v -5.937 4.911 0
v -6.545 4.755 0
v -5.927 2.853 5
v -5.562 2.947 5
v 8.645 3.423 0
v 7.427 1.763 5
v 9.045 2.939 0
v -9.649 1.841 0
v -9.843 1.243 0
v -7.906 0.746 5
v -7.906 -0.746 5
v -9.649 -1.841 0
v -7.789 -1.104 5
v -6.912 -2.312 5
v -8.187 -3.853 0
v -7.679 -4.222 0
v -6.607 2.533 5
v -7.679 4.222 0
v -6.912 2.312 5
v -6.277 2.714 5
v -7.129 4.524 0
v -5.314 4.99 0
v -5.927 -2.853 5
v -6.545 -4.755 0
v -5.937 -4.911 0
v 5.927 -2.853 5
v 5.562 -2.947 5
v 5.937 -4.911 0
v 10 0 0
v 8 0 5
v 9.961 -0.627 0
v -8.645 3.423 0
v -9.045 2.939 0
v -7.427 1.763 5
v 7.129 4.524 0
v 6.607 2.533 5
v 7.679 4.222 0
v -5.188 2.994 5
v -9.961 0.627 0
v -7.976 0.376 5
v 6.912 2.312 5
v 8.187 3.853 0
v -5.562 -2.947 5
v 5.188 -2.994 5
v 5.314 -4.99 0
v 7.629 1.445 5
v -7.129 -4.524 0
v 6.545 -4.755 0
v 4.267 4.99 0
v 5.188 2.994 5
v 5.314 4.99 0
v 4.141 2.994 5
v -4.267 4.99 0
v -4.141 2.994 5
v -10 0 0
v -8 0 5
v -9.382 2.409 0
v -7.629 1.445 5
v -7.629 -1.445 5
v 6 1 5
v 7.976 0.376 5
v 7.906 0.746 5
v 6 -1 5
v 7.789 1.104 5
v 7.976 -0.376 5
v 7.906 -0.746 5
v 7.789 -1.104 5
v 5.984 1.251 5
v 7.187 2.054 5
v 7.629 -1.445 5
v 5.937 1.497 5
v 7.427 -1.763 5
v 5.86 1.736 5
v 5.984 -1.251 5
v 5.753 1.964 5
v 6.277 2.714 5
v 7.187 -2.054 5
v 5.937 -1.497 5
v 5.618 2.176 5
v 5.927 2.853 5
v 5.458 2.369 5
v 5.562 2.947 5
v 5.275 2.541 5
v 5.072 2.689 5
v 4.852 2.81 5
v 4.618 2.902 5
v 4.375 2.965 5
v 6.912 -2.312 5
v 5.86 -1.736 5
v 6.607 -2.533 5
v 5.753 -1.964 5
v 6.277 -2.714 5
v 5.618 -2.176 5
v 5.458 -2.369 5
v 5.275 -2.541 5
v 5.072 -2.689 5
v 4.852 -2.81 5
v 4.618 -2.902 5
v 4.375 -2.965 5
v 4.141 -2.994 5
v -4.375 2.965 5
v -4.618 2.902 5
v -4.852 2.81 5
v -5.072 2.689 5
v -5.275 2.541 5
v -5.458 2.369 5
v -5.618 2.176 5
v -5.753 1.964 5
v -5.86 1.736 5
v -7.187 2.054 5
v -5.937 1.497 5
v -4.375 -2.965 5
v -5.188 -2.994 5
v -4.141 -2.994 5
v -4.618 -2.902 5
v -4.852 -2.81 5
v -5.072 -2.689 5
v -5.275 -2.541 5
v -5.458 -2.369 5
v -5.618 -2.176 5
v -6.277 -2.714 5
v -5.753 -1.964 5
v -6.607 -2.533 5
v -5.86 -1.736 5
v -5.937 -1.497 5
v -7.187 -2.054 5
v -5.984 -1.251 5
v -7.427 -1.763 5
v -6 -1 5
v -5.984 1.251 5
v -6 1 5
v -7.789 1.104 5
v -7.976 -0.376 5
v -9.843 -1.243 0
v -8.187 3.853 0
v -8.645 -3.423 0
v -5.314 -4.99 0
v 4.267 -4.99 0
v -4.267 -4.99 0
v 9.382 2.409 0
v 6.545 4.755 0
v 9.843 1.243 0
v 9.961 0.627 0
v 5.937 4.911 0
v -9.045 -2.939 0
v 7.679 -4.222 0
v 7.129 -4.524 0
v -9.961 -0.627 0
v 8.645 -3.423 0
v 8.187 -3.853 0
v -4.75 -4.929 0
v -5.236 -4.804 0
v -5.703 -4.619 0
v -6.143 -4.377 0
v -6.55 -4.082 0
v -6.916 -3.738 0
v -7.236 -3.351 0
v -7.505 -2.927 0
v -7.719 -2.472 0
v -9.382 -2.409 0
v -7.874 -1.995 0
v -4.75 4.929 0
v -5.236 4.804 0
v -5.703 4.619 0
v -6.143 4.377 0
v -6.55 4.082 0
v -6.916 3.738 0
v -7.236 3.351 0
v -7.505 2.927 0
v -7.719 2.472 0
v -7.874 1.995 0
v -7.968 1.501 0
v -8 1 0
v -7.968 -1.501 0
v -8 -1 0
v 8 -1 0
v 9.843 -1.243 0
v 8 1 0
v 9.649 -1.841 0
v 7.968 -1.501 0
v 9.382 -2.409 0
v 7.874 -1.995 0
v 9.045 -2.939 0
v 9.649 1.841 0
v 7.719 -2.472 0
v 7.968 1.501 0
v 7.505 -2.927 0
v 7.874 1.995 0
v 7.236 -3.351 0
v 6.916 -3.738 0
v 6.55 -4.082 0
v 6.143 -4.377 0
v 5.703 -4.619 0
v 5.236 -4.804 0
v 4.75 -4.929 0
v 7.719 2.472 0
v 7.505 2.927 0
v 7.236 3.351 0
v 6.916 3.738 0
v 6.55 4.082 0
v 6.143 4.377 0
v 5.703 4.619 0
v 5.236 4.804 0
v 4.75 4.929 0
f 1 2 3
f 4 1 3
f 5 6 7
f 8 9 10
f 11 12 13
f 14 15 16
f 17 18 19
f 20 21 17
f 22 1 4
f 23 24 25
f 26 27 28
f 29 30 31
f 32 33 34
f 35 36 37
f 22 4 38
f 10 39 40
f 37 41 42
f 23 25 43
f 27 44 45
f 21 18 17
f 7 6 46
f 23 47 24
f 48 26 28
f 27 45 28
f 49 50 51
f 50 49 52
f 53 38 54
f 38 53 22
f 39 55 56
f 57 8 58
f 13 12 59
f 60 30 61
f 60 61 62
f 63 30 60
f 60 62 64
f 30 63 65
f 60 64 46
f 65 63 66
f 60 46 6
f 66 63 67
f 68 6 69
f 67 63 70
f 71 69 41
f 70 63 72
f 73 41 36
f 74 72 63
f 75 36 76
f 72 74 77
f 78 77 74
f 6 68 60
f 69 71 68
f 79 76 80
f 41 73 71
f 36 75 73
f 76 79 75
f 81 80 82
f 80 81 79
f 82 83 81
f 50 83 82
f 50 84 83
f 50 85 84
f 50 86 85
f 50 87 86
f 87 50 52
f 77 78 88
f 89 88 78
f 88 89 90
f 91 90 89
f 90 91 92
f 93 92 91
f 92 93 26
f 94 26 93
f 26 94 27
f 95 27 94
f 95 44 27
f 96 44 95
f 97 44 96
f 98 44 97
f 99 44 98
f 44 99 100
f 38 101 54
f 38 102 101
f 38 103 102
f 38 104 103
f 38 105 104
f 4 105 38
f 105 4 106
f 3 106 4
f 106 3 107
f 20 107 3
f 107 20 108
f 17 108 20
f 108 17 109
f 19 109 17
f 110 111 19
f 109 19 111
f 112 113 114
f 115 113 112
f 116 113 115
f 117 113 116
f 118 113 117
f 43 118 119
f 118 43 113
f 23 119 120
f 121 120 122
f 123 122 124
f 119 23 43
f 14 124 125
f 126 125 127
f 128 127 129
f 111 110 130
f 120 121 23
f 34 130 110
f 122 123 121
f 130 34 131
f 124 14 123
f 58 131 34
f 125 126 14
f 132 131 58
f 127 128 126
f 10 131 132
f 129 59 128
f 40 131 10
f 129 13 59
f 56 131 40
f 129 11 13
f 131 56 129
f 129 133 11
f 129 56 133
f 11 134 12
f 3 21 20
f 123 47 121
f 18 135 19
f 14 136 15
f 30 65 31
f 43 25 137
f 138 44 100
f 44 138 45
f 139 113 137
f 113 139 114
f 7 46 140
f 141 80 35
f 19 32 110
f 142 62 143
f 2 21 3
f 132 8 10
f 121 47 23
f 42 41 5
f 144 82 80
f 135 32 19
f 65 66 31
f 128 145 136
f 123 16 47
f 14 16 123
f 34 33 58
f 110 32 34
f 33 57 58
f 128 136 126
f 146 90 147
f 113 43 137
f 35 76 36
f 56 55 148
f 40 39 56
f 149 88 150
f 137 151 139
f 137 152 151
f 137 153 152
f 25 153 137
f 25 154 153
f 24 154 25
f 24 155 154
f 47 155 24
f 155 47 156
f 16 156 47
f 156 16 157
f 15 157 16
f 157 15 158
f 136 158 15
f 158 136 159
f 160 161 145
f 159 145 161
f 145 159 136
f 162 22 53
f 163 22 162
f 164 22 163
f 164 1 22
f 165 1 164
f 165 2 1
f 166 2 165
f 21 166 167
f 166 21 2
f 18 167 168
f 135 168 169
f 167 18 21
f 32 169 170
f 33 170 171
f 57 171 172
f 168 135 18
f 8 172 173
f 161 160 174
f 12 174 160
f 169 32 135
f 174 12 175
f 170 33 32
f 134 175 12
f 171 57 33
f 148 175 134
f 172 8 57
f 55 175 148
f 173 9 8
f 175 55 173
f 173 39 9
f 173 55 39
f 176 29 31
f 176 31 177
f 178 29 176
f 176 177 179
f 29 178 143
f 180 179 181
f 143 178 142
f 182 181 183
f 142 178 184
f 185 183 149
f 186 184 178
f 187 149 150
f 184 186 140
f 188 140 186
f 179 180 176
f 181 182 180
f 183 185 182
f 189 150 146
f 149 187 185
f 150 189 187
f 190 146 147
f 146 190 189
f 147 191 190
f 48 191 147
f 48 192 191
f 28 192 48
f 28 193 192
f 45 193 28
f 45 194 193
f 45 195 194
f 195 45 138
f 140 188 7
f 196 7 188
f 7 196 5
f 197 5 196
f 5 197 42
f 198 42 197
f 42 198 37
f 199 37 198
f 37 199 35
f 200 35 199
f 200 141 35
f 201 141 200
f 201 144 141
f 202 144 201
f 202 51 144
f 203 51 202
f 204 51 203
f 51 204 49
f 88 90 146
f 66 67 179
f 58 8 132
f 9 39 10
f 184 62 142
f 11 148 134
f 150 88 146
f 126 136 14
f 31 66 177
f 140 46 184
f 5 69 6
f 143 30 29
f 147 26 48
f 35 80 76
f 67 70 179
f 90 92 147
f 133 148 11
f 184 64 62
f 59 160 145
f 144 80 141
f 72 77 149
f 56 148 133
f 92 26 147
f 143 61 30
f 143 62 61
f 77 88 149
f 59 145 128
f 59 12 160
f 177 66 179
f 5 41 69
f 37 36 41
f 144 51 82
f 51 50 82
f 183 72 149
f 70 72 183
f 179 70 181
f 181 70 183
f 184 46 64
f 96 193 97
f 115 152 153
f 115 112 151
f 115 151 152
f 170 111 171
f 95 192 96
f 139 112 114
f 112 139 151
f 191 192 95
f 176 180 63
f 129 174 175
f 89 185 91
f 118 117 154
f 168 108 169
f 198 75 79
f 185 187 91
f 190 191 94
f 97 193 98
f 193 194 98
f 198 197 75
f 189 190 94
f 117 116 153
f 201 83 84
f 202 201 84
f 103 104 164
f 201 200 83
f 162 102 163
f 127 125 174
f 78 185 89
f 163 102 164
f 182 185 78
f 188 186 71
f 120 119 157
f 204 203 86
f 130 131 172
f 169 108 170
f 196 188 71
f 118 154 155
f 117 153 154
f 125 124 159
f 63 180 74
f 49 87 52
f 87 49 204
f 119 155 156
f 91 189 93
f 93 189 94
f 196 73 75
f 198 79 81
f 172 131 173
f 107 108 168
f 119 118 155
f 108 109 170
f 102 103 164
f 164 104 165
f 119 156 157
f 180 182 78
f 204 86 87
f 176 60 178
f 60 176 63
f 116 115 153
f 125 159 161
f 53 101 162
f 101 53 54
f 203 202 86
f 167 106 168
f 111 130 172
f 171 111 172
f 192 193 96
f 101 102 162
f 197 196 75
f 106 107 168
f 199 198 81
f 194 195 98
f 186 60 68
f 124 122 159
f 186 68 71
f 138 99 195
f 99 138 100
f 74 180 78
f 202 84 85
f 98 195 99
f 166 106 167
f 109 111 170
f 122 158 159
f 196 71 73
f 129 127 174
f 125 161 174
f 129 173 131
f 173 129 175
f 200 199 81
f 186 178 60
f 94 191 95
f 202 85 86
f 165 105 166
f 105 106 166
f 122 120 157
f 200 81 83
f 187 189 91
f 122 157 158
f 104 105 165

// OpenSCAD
$fn = 50;


difference() {
	union() {
		translate(v = [0, 0, 0]) {
			rotate(a = [0, 0, 0]) {
				difference() {
					union() {
						hull() {
							translate(v = [-5.0000000000, 0.0000000000, 0]) {
								cylinder(h = 5, r = 5, r1 = 5, r2 = 3);
							}
							translate(v = [5.0000000000, 0.0000000000, 0]) {
								cylinder(h = 5, r = 5, r1 = 5, r2 = 3);
							}
							translate(v = [-5.0000000000, 0.0000000000, 0]) {
								cylinder(h = 5, r = 5, r1 = 5, r2 = 3);
							}
							translate(v = [5.0000000000, 0.0000000000, 0]) {
								cylinder(h = 5, r = 5, r1 = 5, r2 = 3);
							}
						}
					}
					union() {
						hull() {
							translate(v = [-4.0000000000, -1.0000000000, 0]) {
								cylinder(h = 5, r = 5, r1 = 4, r2 = 2);
							}
							translate(v = [4.0000000000, -1.0000000000, 0]) {
								cylinder(h = 5, r = 5, r1 = 4, r2 = 2);
							}
							translate(v = [-4.0000000000, 1.0000000000, 0]) {
								cylinder(h = 5, r = 5, r1 = 4, r2 = 2);
							}
							translate(v = [4.0000000000, 1.0000000000, 0]) {
								cylinder(h = 5, r = 5, r1 = 4, r2 = 2);
							}
						}
					}
				}
			}
		}
	}
	union();
}
